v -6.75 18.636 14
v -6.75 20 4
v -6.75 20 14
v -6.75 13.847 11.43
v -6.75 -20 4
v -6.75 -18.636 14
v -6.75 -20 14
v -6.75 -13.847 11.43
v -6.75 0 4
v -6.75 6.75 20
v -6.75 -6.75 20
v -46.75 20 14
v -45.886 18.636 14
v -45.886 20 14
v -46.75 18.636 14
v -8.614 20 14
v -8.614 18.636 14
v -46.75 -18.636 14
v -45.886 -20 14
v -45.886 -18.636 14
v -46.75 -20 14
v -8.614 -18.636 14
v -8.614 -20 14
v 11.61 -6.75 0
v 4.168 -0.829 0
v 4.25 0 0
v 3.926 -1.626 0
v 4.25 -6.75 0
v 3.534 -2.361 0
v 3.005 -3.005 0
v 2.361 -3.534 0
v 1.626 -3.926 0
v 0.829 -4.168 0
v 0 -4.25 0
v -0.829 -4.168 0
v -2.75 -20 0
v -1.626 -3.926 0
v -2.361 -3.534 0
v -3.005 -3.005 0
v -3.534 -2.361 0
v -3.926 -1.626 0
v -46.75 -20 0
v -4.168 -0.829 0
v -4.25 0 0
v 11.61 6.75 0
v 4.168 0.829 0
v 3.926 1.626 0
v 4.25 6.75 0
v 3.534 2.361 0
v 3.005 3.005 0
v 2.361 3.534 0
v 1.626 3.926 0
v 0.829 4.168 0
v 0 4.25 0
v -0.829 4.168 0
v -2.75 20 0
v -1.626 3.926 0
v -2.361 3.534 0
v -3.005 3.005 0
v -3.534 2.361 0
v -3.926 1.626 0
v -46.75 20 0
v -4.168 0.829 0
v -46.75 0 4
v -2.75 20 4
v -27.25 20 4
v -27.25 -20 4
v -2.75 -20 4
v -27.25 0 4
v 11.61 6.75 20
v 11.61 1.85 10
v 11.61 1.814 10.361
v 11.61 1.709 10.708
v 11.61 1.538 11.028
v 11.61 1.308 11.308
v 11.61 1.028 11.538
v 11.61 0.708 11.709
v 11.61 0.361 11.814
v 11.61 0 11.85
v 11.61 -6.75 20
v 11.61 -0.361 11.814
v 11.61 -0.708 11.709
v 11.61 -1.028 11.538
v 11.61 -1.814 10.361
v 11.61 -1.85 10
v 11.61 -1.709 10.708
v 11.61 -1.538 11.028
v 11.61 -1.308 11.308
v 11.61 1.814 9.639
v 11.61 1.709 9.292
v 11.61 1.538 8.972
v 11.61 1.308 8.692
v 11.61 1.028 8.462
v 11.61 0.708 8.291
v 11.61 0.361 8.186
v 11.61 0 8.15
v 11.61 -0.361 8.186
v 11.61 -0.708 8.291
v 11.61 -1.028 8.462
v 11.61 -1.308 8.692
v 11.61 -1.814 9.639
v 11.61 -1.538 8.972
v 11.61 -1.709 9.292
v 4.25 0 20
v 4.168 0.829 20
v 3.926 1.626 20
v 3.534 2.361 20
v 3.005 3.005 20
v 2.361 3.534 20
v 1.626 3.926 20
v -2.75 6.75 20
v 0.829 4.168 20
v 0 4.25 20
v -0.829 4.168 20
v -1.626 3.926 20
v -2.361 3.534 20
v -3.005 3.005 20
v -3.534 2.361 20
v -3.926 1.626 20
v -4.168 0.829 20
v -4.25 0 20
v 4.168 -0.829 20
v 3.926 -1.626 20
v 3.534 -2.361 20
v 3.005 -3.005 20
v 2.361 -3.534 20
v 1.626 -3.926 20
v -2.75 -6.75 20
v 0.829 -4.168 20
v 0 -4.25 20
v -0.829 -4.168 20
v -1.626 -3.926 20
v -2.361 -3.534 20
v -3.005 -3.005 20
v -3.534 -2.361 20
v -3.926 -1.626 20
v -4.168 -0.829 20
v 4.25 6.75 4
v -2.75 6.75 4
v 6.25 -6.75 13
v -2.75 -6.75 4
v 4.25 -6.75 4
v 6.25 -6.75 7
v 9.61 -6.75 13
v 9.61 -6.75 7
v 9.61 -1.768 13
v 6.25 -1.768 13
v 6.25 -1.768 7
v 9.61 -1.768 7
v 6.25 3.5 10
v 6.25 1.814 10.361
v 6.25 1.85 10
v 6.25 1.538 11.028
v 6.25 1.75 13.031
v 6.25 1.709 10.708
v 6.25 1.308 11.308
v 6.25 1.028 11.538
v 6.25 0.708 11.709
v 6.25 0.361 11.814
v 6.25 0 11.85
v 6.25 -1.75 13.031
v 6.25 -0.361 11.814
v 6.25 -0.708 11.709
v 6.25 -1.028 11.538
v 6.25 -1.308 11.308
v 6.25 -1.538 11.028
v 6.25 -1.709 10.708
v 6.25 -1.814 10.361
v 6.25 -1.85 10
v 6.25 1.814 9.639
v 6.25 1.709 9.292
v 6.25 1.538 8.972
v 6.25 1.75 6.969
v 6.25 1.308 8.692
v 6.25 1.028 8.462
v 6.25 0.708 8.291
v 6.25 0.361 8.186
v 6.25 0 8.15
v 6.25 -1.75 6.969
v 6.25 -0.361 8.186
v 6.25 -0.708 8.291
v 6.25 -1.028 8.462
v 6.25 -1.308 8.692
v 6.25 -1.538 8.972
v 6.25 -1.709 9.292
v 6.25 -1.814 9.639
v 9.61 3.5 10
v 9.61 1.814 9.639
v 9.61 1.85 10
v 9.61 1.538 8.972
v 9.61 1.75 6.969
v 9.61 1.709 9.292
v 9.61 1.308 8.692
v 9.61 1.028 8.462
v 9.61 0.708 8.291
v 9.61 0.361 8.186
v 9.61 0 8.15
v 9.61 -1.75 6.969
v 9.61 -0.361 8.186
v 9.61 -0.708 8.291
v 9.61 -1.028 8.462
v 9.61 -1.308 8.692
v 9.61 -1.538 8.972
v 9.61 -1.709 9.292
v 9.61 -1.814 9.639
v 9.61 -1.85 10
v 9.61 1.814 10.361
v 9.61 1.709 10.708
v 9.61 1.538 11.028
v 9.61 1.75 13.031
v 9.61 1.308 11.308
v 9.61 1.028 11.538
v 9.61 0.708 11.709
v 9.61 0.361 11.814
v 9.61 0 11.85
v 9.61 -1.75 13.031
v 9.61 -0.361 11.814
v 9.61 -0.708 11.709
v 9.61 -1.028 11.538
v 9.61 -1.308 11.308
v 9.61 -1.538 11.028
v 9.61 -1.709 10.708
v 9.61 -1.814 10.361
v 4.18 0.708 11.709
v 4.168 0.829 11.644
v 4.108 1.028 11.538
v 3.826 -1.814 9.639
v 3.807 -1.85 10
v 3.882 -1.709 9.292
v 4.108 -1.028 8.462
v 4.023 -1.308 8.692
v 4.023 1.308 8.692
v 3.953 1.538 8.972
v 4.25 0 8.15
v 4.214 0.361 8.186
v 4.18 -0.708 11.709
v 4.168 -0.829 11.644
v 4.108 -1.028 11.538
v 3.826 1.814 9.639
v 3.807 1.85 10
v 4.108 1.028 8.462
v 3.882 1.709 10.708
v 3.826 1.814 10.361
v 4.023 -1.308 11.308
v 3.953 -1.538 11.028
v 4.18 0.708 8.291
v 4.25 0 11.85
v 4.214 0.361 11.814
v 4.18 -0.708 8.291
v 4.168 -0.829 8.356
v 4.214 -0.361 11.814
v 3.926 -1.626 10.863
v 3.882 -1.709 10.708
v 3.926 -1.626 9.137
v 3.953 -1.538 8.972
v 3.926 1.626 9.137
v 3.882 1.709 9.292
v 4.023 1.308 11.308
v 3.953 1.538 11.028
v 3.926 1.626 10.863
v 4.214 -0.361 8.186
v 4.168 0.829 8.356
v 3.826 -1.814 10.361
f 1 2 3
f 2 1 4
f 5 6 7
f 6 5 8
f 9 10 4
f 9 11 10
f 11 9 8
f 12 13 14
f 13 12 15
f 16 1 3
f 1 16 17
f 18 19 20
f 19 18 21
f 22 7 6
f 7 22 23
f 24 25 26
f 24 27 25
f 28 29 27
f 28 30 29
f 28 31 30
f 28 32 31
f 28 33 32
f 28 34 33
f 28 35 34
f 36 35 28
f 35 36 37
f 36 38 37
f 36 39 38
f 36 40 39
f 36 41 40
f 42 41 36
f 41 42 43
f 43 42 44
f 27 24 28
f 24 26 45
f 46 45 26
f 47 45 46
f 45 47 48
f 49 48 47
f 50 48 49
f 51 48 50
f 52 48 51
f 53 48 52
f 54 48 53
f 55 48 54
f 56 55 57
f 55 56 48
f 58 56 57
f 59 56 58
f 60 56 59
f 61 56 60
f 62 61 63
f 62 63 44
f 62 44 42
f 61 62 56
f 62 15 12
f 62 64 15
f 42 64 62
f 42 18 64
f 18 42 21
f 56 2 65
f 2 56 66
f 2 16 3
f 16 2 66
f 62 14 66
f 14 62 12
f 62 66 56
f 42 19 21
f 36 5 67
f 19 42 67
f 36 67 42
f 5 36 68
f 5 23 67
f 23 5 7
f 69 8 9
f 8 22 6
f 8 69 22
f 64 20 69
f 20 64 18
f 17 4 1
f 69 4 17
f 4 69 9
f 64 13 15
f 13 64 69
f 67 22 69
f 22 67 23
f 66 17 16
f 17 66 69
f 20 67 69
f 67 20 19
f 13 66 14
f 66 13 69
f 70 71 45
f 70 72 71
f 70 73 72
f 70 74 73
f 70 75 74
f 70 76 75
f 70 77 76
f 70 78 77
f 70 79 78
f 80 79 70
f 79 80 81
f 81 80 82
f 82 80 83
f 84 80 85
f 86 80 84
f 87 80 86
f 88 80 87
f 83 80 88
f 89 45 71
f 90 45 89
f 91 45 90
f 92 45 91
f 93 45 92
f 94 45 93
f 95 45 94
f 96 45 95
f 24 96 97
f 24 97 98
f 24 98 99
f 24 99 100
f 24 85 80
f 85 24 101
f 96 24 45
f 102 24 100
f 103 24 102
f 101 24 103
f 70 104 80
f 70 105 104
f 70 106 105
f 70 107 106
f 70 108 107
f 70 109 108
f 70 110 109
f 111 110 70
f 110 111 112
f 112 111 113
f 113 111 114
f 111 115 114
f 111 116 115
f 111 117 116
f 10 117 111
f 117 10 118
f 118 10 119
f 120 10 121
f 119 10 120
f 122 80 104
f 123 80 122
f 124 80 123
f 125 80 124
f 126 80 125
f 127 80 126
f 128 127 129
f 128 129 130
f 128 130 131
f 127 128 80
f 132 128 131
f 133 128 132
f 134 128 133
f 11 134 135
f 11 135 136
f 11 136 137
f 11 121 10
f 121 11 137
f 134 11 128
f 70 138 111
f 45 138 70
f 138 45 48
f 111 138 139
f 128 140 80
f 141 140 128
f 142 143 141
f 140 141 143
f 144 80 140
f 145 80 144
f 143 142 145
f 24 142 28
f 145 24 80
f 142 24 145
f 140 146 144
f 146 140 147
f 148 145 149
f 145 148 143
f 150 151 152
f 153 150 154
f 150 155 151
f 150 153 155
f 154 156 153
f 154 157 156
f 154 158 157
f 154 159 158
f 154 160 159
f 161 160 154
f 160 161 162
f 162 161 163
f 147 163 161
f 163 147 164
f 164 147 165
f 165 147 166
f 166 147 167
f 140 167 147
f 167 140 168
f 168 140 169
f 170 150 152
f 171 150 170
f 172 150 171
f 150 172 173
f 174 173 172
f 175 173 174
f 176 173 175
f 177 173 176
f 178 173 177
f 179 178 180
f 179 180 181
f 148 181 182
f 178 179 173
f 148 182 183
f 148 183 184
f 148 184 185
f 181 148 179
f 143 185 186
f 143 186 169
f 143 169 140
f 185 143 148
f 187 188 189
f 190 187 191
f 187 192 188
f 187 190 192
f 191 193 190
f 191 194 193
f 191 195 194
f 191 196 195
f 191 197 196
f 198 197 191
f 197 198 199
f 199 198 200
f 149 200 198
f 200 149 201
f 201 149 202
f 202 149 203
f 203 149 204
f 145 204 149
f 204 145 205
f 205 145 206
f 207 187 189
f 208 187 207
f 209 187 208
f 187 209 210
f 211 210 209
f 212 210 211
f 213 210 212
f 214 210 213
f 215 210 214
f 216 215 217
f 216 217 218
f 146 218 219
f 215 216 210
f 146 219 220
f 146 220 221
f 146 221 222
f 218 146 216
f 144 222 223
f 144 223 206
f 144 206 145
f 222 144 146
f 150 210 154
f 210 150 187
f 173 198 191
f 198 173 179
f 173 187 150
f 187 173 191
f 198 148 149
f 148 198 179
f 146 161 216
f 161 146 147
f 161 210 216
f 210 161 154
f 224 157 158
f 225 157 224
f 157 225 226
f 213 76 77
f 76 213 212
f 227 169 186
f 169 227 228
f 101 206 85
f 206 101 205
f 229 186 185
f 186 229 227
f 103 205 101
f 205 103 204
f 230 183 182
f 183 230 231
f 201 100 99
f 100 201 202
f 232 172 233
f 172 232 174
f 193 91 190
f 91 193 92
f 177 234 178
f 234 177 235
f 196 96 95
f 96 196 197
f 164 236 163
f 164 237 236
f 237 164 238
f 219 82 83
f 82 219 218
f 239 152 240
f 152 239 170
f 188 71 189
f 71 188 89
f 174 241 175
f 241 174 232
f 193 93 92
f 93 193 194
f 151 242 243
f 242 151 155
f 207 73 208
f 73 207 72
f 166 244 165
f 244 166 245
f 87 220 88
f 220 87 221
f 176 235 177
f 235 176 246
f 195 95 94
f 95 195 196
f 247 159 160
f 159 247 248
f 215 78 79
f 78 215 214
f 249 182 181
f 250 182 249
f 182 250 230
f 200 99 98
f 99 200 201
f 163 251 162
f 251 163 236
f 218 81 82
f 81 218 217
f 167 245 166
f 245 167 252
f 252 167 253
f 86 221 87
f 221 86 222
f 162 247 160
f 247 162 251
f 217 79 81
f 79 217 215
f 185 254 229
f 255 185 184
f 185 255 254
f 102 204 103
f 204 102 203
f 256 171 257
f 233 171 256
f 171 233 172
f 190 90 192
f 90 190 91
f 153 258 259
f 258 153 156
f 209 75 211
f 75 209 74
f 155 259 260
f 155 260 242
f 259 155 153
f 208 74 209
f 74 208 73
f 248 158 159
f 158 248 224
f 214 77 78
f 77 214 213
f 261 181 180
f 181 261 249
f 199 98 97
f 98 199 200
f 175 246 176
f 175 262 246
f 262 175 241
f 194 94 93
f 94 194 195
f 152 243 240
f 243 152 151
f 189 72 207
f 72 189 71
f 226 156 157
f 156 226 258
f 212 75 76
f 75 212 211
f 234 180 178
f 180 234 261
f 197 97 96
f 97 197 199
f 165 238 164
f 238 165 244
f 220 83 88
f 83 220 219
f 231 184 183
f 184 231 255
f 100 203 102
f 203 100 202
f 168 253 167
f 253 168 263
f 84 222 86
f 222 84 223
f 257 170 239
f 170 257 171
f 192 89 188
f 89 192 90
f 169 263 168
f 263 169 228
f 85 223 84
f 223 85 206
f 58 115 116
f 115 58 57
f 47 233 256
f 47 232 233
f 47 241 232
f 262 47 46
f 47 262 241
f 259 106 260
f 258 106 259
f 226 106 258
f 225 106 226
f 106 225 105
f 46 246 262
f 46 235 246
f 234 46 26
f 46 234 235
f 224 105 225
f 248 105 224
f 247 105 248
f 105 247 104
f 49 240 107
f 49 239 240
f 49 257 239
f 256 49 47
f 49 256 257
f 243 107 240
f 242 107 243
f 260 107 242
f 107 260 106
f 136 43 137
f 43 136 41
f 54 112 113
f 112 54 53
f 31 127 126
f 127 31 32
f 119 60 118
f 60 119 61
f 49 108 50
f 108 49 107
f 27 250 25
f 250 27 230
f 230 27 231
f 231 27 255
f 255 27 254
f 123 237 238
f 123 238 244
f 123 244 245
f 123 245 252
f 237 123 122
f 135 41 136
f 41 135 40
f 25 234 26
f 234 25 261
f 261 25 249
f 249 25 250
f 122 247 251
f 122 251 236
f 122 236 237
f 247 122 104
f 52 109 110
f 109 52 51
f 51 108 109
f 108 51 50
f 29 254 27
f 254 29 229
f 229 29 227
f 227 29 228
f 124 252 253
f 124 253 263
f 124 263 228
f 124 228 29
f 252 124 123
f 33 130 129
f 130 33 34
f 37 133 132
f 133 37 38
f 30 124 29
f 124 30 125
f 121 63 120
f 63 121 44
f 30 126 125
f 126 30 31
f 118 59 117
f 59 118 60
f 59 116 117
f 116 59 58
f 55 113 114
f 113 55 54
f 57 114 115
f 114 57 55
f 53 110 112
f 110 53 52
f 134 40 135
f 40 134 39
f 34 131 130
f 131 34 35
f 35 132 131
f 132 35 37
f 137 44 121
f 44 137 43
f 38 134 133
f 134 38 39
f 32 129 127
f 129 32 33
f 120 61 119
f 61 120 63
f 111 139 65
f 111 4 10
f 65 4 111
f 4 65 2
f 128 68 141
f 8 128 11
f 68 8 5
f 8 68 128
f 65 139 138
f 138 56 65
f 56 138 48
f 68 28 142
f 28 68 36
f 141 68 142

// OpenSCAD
// TODO - supports underneath platform (hard to print without flat platform, print inverted - but could modify current model)


//CUSTOMIZER VARIABLES

/* [Basic_Parameters] */

// Platform style
platform_style = 3; // [0:"Flat", 1:"V Outward", 2:"V Across", 3:"Double V"]

// Platform length, in mm
platform_length = 40; // [10:1:100];

// Platform width, in mm
platform_width = 40; // [10:1:100];

// Platform height, in mm
platform_height = 4;    // [1:40]

// V cut height, in mm
v_height = 10;  // [1:100]

// Rod diameter, in mm
rod_diameter = 8.0;  // [2.0:0.1:40]

// Bolt diameter, in mm
bolt_diameter = 3.0;    // [2:0.1:20]

// Nut diameter, in mm
nut_diameter = 6.0;  // [3:0.1:40]

// Nut thickness, in mm
nut_thickness = 2.8;  // [1.0:0.1:30]


/* [Extra_Features_for_Strength] */

// Extra height for rod clamp, in mm
clamp_extra = 10;    // [0:100]

// Margin to support the rods, in mm
rod_margin = 5; // [2:30]

// Nut clamp width margin, in mm
nut_clamp_margin = 4;   // [2:30]

//CUSTOMIZER VARIABLES END


// Sanity checks
if( rod_diameter <= 0
    || bolt_diameter <= 0 || nut_diameter <= 0 || nut_thickness <= 0)
{
    echo("<B>Error: Missing important parameters</B>");
}

if(nut_diameter <= bolt_diameter)
{
    echo("<B>Error: Nut size too small for bolt</B>");
}

// how much extra space to allow in nut trap, not user settable
nut_space_factor = 1.20;

nut_trap_len = nut_thickness*nut_space_factor;

bolt_rad = (bolt_diameter+0.7)/2;  // this should be almost loose
rod_rad = (rod_diameter+0.5)/2;  // should be sorta tight

z_rod_diameter = (rod_rad*2);
z_nut_size = 0;


// x length
main_width = max( 10, (rod_rad*2) + rod_margin/2 + nut_trap_len + nut_clamp_margin );
// y length
main_height= max( 10, max(z_rod_diameter+rod_margin,z_nut_size), (bolt_rad*2)+nut_clamp_margin );
// z length
main_depth = max( 10, nut_diameter + nut_clamp_margin, (bolt_rad*2)+nut_clamp_margin, platform_height ) + clamp_extra;




// our object, translated to be flat on xy plane for easy STL generation
component_platform();


module hexagon(height,radius) 
{
  linear_extrude(height)
    circle(radius,$fn=6);
}

module nuttrap(){
  trap_depth = max( main_depth, main_height );
  translate([0,-nut_trap_len/2,trap_depth/2])
    cube([nut_diameter,nut_trap_len,trap_depth],center=true);
  rotate([90,360/12,0]) // so point is down, nut trapped by straight sides
    hexagon(nut_trap_len,(nut_diameter+1)/2);
}


module component_platform() {

    rod_x = 0;
    
    nut_x = rod_x + rod_rad + (nut_clamp_margin/2);
    nut_y = 0;

    rod_length = max(main_height,main_depth) + 20;
    
    platform_x = -rod_rad -rod_margin/2;
    
    platform_depth = platform_height + ((platform_style == 0) ? 0 : v_height);
    
    difference() {
        translate([-platform_length/2 + platform_x,0,platform_depth/2])
            cube([platform_length,platform_width,platform_depth],center = true);
        
        cut_width = platform_width + 1;
        cut_length = platform_length + 1;
        cut_height = v_height + 1;
       
        if (platform_style == 1 || platform_style == 3) {
            v_width = cut_width/2;
            translate([platform_x-cut_length,0,platform_height])
              rotate([90,0,90])
                linear_extrude(cut_length)
                  polygon( [ [0, 0], [v_width, cut_height], [-v_width, cut_height] ] );
        }
        
        if (platform_style == 2 || platform_style == 3) {
            v_width = cut_length/2;
            translate([platform_x-cut_length/2,cut_width/2,platform_height])
              rotate([90,0,0])
                linear_extrude(cut_width)
                  polygon( [ [0, 0], [v_width, cut_height], [-v_width, cut_height] ] );
        }
    }
    

    tri_width = platform_width/2 - main_height/2;
    tri_height = main_depth - platform_height;
    translate([platform_x+platform_height,main_height/2,platform_height])
      rotate([0,-90,0])
        linear_extrude(platform_height)
          polygon( [ [0, 0], [tri_height, 0], [0, tri_width] ] );
    translate([platform_x+platform_height,-main_height/2,platform_height])
      rotate([0,-90,0])
        linear_extrude(platform_height)
          polygon( [ [0, 0], [tri_height, 0], [0, -tri_width] ] );
    
    tri2_width = (rod_rad*2) + rod_margin/2 - platform_height;
    tri2_height = tri_width;
    translate([platform_x+platform_height,main_height/2,0])
        linear_extrude(platform_height)
          polygon( [ [0, 0], [tri2_width, 0], [0, tri2_height] ] );
    translate([platform_x+platform_height,-main_height/2,0])
        linear_extrude(platform_height)
          polygon( [ [0, 0], [tri2_width, 0], [0, -tri2_height] ] );
 
 
    translate([0,0,main_depth/2])
        difference() {
    
          union() {
              // the main block
              testx = -main_width/2 + rod_rad + nut_trap_len + nut_clamp_margin;
              translate([testx,0,0])
                cube([main_width,main_height,main_depth],center = true);

             // strength bar next to platform, connects to triangles, can overlap rod!
             translate([platform_x,-platform_width/2,-main_depth/2])
                cube([platform_height,platform_width,platform_height]);
          }
    
          // rod clamp nut and bolt hole
          translate([nut_x,nut_y,0])
            rotate([0,-90,90])
              nuttrap();
          translate([rod_x,nut_y,0])
            rotate([0,90,0])
              cylinder(main_width,bolt_rad,bolt_rad,$fn=32);
    
          // the rod
        #color("green")
          translate([rod_x,0,0])
            rotate([0,0,0])
              cylinder(rod_length,rod_rad,rod_rad,center=true,$fn=32);
    
       }

}
